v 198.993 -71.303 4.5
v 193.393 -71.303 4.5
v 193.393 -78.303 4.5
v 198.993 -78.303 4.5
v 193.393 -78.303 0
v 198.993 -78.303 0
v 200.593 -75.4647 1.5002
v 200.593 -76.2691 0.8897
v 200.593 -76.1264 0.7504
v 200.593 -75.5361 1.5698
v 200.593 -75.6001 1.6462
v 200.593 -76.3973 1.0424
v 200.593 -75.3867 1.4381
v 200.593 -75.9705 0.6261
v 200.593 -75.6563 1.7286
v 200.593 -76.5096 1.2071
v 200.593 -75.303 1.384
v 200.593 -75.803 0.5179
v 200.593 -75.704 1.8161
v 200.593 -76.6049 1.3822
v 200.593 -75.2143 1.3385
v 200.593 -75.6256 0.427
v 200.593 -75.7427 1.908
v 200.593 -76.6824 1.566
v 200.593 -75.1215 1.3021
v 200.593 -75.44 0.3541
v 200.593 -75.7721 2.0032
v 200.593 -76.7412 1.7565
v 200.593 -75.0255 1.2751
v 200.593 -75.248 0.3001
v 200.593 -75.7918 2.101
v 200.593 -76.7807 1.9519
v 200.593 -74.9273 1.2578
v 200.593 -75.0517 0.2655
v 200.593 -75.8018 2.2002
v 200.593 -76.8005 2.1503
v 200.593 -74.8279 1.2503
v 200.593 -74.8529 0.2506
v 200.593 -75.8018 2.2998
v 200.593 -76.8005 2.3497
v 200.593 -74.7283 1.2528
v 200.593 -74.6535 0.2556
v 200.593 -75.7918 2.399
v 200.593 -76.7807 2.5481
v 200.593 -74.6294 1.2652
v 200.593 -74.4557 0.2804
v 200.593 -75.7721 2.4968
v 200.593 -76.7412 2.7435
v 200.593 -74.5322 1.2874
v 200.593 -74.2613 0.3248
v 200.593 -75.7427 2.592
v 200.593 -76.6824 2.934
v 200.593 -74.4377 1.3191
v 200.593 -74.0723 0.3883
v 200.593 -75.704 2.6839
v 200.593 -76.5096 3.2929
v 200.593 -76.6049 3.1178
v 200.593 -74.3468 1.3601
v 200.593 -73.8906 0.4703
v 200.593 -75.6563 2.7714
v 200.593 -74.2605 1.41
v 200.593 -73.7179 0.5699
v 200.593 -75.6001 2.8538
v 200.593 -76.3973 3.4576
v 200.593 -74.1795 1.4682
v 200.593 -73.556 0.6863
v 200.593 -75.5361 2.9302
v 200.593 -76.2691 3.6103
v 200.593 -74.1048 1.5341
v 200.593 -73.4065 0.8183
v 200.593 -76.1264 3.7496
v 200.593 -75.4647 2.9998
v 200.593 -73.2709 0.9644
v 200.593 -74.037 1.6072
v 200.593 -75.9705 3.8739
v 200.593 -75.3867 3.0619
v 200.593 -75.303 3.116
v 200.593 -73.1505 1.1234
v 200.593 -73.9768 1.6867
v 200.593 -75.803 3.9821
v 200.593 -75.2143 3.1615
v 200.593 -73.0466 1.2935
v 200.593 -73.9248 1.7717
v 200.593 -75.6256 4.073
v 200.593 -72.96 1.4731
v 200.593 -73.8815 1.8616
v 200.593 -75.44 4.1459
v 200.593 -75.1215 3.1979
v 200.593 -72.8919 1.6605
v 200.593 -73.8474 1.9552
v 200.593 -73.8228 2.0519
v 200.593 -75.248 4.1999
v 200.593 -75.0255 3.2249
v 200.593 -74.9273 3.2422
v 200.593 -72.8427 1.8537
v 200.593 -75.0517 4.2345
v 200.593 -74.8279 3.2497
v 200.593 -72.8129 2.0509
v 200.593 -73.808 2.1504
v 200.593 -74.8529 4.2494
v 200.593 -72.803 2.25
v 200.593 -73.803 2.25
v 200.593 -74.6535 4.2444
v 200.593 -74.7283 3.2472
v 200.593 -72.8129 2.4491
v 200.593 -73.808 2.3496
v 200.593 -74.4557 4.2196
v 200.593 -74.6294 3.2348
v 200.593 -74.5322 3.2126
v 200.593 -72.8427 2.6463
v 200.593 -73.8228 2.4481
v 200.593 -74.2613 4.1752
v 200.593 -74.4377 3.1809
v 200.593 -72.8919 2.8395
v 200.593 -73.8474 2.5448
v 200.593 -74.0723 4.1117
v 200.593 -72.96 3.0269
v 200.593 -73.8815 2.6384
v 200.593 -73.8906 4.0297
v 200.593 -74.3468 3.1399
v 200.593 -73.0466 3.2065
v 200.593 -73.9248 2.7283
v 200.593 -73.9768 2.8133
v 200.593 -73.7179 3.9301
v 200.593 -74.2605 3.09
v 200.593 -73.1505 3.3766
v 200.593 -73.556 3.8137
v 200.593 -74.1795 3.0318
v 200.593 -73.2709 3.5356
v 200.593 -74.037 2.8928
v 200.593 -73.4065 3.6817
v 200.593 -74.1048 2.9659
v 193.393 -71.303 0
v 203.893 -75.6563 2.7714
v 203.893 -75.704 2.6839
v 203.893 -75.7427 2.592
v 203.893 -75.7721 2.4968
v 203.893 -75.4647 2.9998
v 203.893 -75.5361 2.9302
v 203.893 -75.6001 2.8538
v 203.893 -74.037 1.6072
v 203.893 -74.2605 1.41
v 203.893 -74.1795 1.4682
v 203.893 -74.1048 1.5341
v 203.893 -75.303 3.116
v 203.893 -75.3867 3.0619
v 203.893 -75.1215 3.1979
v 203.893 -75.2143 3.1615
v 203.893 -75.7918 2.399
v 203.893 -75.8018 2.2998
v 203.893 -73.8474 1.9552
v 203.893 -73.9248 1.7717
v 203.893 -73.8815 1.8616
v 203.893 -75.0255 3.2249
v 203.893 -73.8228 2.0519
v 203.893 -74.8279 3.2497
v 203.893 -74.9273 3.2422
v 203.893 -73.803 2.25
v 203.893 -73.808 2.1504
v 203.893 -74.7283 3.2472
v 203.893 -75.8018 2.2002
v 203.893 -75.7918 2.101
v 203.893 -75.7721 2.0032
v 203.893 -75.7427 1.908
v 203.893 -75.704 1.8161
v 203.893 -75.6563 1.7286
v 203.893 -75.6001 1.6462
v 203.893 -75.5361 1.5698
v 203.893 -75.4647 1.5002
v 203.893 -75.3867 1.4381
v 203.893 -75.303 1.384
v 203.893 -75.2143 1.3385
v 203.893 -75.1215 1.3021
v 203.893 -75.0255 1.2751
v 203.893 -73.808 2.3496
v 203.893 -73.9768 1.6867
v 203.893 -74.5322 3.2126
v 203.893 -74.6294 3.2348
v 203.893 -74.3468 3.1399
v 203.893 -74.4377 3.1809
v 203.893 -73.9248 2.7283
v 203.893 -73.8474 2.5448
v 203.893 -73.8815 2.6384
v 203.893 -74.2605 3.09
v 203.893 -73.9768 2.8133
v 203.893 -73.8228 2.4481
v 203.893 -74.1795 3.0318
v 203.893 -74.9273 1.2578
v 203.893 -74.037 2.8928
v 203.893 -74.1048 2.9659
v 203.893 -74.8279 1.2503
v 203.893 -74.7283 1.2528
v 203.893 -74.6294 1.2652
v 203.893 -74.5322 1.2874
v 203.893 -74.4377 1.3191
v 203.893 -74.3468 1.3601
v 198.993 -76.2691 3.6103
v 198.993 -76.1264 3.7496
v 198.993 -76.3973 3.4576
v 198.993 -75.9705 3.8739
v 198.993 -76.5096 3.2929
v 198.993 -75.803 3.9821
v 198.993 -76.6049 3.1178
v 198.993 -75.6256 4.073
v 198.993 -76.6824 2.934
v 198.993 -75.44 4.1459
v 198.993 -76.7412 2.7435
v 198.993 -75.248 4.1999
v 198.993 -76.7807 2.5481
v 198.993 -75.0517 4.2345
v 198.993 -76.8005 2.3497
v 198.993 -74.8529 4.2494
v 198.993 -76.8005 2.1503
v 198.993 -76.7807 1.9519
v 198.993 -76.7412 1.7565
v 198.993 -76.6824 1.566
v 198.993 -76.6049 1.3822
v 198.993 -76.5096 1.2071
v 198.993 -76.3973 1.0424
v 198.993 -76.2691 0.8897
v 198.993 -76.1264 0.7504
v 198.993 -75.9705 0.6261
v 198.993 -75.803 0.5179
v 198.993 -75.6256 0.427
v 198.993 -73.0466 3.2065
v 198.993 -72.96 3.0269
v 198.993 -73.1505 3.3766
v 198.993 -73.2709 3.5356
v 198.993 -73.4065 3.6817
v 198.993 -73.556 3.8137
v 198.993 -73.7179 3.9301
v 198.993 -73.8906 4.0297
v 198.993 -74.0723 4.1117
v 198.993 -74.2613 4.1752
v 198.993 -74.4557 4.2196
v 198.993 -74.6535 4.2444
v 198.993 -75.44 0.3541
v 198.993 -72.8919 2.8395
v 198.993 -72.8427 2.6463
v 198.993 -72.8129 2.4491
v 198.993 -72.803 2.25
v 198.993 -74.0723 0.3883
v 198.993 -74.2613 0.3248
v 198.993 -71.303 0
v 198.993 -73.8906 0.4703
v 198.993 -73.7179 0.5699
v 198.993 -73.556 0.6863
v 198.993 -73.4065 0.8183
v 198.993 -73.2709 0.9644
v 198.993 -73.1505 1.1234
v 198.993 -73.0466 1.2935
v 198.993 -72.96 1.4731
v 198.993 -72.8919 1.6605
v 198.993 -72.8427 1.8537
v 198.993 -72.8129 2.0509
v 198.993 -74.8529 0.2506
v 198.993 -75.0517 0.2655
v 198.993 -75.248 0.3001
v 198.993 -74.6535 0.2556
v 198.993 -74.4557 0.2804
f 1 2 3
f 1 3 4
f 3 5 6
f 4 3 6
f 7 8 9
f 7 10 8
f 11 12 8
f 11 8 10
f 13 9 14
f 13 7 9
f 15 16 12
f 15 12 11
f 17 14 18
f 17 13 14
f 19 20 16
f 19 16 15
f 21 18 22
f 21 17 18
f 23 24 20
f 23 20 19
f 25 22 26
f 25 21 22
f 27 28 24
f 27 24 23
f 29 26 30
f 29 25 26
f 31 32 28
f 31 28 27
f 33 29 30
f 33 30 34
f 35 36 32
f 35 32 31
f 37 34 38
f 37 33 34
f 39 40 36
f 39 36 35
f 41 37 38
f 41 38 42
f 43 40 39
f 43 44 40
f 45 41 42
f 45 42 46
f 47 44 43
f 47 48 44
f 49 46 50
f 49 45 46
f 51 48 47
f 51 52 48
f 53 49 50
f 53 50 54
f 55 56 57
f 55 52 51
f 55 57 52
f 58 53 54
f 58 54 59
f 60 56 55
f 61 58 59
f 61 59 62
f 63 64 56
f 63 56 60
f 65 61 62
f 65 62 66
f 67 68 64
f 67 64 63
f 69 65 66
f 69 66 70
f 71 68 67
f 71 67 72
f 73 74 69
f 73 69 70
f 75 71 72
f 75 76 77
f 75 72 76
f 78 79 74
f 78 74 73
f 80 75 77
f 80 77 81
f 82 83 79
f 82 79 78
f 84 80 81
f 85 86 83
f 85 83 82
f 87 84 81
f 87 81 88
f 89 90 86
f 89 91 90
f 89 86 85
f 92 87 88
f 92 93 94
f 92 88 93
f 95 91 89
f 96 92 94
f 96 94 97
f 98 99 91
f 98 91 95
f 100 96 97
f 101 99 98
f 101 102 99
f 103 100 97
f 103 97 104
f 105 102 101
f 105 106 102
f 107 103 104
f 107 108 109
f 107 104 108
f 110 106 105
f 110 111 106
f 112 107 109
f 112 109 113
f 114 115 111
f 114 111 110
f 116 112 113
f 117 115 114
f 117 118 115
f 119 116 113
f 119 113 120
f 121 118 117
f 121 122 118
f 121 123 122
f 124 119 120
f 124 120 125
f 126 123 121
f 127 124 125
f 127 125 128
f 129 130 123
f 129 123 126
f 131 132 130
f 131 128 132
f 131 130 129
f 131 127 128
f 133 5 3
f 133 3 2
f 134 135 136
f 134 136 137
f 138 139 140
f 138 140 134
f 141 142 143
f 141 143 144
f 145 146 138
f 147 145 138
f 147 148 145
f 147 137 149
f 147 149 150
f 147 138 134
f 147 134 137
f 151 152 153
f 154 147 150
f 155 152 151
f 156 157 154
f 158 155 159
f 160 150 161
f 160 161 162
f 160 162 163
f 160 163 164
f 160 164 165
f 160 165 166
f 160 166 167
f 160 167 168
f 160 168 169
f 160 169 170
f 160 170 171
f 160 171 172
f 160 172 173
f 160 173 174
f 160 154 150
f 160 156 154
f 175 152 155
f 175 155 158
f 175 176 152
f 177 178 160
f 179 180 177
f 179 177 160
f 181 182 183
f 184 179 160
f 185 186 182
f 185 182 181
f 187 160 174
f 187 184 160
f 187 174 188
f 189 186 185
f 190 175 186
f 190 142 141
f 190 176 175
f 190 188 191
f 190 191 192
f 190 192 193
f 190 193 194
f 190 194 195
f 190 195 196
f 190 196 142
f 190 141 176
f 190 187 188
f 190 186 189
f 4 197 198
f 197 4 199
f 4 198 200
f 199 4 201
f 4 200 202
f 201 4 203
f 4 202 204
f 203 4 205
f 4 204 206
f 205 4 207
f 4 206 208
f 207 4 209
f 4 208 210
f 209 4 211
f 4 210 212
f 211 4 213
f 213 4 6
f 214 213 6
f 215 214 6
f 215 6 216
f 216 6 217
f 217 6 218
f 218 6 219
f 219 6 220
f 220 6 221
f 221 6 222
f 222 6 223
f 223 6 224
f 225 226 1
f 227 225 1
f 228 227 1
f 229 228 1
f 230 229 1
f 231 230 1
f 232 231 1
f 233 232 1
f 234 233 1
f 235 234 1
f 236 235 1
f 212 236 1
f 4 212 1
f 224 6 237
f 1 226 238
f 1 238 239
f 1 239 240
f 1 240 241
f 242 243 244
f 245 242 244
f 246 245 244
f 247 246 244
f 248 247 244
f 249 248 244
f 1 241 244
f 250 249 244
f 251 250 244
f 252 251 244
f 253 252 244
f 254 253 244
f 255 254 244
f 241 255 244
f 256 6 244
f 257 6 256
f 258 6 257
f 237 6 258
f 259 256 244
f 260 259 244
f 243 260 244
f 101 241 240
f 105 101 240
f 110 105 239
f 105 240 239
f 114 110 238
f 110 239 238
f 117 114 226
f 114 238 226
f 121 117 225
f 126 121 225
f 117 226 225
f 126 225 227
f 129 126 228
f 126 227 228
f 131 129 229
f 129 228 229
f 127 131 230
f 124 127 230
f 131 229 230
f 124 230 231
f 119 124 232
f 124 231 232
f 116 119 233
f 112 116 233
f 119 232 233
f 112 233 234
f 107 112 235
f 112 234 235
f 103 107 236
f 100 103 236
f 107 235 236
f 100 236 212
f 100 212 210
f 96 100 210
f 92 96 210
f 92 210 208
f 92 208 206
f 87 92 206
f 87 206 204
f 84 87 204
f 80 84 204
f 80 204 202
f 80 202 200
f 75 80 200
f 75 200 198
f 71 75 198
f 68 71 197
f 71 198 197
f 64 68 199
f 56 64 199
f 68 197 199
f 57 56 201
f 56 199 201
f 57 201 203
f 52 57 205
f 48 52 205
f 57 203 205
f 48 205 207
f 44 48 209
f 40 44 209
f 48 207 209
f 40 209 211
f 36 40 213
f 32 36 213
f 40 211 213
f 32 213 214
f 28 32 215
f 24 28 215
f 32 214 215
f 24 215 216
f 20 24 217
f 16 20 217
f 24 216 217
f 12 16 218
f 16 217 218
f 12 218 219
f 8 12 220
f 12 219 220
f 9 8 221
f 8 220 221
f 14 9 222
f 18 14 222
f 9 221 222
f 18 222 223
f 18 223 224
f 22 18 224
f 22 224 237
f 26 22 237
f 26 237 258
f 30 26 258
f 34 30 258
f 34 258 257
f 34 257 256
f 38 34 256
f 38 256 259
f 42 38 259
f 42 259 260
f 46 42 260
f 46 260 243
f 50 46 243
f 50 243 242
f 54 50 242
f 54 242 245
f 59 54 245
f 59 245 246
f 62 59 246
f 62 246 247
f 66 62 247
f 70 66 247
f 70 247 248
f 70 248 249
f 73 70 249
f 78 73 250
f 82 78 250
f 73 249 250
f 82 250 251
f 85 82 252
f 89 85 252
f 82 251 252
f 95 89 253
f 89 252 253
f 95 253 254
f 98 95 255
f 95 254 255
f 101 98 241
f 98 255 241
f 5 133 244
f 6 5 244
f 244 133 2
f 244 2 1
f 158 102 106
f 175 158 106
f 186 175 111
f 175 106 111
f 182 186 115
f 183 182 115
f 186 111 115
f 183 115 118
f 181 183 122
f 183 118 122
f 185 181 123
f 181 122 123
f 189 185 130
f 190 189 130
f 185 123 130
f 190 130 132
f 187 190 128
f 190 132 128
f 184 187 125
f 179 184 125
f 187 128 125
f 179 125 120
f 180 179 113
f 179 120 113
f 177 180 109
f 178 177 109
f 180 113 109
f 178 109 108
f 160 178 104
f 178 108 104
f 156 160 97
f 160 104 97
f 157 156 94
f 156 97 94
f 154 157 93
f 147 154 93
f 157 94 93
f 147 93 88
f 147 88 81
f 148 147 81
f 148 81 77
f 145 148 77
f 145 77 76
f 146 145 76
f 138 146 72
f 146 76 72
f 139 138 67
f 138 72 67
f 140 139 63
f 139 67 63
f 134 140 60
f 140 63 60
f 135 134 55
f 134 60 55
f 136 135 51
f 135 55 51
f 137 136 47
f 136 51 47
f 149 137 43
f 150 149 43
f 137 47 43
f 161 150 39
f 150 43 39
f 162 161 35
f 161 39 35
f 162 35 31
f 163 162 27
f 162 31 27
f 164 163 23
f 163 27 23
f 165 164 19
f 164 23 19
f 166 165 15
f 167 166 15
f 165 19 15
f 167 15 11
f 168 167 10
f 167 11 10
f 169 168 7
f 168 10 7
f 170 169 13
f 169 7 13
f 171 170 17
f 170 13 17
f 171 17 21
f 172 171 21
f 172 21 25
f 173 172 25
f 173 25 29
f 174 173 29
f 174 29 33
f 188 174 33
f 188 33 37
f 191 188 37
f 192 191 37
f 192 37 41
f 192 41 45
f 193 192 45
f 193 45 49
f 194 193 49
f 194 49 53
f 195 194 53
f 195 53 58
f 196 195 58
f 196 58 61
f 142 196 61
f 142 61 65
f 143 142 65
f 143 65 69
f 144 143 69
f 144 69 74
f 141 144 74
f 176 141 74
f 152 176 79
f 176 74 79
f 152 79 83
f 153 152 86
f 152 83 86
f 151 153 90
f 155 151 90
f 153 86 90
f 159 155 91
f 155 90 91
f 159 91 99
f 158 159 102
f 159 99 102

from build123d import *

# Parameters (mm, degrees)
SKETCH_W     = 5.6
SKETCH_H     = 7
PAD_DEPTH    = 4.5
SKETCH001_R  = 2
PAD001_DEPTH = 1.6
SKETCH002_R  = 1
PAD002_DEPTH = 3.3


with BuildPart() as part:
    # Sketch (on Face1 of CopyPcb_ca95) → Pad (new body)
    with BuildSketch(Plane.XY):
        with Locations((196.193, -74.803)):
            Rectangle(SKETCH_W, SKETCH_H)
    extrude(amount=PAD_DEPTH)

    # Sketch001 (on Face2 of Pad) → Pad001 (join)
    with BuildSketch(Plane.YZ.offset(198.993)):
        with Locations((-74.803, 2.25)):
            Circle(SKETCH001_R)
    extrude(amount=PAD001_DEPTH)

    # Sketch002 (on Face8 of Pad001) → Pad002 (join)
    with BuildSketch(Plane.YZ.offset(200.593)):
        with Locations((-74.803, 2.25)):
            Circle(SKETCH002_R)
    extrude(amount=PAD002_DEPTH)


solid = part.part
